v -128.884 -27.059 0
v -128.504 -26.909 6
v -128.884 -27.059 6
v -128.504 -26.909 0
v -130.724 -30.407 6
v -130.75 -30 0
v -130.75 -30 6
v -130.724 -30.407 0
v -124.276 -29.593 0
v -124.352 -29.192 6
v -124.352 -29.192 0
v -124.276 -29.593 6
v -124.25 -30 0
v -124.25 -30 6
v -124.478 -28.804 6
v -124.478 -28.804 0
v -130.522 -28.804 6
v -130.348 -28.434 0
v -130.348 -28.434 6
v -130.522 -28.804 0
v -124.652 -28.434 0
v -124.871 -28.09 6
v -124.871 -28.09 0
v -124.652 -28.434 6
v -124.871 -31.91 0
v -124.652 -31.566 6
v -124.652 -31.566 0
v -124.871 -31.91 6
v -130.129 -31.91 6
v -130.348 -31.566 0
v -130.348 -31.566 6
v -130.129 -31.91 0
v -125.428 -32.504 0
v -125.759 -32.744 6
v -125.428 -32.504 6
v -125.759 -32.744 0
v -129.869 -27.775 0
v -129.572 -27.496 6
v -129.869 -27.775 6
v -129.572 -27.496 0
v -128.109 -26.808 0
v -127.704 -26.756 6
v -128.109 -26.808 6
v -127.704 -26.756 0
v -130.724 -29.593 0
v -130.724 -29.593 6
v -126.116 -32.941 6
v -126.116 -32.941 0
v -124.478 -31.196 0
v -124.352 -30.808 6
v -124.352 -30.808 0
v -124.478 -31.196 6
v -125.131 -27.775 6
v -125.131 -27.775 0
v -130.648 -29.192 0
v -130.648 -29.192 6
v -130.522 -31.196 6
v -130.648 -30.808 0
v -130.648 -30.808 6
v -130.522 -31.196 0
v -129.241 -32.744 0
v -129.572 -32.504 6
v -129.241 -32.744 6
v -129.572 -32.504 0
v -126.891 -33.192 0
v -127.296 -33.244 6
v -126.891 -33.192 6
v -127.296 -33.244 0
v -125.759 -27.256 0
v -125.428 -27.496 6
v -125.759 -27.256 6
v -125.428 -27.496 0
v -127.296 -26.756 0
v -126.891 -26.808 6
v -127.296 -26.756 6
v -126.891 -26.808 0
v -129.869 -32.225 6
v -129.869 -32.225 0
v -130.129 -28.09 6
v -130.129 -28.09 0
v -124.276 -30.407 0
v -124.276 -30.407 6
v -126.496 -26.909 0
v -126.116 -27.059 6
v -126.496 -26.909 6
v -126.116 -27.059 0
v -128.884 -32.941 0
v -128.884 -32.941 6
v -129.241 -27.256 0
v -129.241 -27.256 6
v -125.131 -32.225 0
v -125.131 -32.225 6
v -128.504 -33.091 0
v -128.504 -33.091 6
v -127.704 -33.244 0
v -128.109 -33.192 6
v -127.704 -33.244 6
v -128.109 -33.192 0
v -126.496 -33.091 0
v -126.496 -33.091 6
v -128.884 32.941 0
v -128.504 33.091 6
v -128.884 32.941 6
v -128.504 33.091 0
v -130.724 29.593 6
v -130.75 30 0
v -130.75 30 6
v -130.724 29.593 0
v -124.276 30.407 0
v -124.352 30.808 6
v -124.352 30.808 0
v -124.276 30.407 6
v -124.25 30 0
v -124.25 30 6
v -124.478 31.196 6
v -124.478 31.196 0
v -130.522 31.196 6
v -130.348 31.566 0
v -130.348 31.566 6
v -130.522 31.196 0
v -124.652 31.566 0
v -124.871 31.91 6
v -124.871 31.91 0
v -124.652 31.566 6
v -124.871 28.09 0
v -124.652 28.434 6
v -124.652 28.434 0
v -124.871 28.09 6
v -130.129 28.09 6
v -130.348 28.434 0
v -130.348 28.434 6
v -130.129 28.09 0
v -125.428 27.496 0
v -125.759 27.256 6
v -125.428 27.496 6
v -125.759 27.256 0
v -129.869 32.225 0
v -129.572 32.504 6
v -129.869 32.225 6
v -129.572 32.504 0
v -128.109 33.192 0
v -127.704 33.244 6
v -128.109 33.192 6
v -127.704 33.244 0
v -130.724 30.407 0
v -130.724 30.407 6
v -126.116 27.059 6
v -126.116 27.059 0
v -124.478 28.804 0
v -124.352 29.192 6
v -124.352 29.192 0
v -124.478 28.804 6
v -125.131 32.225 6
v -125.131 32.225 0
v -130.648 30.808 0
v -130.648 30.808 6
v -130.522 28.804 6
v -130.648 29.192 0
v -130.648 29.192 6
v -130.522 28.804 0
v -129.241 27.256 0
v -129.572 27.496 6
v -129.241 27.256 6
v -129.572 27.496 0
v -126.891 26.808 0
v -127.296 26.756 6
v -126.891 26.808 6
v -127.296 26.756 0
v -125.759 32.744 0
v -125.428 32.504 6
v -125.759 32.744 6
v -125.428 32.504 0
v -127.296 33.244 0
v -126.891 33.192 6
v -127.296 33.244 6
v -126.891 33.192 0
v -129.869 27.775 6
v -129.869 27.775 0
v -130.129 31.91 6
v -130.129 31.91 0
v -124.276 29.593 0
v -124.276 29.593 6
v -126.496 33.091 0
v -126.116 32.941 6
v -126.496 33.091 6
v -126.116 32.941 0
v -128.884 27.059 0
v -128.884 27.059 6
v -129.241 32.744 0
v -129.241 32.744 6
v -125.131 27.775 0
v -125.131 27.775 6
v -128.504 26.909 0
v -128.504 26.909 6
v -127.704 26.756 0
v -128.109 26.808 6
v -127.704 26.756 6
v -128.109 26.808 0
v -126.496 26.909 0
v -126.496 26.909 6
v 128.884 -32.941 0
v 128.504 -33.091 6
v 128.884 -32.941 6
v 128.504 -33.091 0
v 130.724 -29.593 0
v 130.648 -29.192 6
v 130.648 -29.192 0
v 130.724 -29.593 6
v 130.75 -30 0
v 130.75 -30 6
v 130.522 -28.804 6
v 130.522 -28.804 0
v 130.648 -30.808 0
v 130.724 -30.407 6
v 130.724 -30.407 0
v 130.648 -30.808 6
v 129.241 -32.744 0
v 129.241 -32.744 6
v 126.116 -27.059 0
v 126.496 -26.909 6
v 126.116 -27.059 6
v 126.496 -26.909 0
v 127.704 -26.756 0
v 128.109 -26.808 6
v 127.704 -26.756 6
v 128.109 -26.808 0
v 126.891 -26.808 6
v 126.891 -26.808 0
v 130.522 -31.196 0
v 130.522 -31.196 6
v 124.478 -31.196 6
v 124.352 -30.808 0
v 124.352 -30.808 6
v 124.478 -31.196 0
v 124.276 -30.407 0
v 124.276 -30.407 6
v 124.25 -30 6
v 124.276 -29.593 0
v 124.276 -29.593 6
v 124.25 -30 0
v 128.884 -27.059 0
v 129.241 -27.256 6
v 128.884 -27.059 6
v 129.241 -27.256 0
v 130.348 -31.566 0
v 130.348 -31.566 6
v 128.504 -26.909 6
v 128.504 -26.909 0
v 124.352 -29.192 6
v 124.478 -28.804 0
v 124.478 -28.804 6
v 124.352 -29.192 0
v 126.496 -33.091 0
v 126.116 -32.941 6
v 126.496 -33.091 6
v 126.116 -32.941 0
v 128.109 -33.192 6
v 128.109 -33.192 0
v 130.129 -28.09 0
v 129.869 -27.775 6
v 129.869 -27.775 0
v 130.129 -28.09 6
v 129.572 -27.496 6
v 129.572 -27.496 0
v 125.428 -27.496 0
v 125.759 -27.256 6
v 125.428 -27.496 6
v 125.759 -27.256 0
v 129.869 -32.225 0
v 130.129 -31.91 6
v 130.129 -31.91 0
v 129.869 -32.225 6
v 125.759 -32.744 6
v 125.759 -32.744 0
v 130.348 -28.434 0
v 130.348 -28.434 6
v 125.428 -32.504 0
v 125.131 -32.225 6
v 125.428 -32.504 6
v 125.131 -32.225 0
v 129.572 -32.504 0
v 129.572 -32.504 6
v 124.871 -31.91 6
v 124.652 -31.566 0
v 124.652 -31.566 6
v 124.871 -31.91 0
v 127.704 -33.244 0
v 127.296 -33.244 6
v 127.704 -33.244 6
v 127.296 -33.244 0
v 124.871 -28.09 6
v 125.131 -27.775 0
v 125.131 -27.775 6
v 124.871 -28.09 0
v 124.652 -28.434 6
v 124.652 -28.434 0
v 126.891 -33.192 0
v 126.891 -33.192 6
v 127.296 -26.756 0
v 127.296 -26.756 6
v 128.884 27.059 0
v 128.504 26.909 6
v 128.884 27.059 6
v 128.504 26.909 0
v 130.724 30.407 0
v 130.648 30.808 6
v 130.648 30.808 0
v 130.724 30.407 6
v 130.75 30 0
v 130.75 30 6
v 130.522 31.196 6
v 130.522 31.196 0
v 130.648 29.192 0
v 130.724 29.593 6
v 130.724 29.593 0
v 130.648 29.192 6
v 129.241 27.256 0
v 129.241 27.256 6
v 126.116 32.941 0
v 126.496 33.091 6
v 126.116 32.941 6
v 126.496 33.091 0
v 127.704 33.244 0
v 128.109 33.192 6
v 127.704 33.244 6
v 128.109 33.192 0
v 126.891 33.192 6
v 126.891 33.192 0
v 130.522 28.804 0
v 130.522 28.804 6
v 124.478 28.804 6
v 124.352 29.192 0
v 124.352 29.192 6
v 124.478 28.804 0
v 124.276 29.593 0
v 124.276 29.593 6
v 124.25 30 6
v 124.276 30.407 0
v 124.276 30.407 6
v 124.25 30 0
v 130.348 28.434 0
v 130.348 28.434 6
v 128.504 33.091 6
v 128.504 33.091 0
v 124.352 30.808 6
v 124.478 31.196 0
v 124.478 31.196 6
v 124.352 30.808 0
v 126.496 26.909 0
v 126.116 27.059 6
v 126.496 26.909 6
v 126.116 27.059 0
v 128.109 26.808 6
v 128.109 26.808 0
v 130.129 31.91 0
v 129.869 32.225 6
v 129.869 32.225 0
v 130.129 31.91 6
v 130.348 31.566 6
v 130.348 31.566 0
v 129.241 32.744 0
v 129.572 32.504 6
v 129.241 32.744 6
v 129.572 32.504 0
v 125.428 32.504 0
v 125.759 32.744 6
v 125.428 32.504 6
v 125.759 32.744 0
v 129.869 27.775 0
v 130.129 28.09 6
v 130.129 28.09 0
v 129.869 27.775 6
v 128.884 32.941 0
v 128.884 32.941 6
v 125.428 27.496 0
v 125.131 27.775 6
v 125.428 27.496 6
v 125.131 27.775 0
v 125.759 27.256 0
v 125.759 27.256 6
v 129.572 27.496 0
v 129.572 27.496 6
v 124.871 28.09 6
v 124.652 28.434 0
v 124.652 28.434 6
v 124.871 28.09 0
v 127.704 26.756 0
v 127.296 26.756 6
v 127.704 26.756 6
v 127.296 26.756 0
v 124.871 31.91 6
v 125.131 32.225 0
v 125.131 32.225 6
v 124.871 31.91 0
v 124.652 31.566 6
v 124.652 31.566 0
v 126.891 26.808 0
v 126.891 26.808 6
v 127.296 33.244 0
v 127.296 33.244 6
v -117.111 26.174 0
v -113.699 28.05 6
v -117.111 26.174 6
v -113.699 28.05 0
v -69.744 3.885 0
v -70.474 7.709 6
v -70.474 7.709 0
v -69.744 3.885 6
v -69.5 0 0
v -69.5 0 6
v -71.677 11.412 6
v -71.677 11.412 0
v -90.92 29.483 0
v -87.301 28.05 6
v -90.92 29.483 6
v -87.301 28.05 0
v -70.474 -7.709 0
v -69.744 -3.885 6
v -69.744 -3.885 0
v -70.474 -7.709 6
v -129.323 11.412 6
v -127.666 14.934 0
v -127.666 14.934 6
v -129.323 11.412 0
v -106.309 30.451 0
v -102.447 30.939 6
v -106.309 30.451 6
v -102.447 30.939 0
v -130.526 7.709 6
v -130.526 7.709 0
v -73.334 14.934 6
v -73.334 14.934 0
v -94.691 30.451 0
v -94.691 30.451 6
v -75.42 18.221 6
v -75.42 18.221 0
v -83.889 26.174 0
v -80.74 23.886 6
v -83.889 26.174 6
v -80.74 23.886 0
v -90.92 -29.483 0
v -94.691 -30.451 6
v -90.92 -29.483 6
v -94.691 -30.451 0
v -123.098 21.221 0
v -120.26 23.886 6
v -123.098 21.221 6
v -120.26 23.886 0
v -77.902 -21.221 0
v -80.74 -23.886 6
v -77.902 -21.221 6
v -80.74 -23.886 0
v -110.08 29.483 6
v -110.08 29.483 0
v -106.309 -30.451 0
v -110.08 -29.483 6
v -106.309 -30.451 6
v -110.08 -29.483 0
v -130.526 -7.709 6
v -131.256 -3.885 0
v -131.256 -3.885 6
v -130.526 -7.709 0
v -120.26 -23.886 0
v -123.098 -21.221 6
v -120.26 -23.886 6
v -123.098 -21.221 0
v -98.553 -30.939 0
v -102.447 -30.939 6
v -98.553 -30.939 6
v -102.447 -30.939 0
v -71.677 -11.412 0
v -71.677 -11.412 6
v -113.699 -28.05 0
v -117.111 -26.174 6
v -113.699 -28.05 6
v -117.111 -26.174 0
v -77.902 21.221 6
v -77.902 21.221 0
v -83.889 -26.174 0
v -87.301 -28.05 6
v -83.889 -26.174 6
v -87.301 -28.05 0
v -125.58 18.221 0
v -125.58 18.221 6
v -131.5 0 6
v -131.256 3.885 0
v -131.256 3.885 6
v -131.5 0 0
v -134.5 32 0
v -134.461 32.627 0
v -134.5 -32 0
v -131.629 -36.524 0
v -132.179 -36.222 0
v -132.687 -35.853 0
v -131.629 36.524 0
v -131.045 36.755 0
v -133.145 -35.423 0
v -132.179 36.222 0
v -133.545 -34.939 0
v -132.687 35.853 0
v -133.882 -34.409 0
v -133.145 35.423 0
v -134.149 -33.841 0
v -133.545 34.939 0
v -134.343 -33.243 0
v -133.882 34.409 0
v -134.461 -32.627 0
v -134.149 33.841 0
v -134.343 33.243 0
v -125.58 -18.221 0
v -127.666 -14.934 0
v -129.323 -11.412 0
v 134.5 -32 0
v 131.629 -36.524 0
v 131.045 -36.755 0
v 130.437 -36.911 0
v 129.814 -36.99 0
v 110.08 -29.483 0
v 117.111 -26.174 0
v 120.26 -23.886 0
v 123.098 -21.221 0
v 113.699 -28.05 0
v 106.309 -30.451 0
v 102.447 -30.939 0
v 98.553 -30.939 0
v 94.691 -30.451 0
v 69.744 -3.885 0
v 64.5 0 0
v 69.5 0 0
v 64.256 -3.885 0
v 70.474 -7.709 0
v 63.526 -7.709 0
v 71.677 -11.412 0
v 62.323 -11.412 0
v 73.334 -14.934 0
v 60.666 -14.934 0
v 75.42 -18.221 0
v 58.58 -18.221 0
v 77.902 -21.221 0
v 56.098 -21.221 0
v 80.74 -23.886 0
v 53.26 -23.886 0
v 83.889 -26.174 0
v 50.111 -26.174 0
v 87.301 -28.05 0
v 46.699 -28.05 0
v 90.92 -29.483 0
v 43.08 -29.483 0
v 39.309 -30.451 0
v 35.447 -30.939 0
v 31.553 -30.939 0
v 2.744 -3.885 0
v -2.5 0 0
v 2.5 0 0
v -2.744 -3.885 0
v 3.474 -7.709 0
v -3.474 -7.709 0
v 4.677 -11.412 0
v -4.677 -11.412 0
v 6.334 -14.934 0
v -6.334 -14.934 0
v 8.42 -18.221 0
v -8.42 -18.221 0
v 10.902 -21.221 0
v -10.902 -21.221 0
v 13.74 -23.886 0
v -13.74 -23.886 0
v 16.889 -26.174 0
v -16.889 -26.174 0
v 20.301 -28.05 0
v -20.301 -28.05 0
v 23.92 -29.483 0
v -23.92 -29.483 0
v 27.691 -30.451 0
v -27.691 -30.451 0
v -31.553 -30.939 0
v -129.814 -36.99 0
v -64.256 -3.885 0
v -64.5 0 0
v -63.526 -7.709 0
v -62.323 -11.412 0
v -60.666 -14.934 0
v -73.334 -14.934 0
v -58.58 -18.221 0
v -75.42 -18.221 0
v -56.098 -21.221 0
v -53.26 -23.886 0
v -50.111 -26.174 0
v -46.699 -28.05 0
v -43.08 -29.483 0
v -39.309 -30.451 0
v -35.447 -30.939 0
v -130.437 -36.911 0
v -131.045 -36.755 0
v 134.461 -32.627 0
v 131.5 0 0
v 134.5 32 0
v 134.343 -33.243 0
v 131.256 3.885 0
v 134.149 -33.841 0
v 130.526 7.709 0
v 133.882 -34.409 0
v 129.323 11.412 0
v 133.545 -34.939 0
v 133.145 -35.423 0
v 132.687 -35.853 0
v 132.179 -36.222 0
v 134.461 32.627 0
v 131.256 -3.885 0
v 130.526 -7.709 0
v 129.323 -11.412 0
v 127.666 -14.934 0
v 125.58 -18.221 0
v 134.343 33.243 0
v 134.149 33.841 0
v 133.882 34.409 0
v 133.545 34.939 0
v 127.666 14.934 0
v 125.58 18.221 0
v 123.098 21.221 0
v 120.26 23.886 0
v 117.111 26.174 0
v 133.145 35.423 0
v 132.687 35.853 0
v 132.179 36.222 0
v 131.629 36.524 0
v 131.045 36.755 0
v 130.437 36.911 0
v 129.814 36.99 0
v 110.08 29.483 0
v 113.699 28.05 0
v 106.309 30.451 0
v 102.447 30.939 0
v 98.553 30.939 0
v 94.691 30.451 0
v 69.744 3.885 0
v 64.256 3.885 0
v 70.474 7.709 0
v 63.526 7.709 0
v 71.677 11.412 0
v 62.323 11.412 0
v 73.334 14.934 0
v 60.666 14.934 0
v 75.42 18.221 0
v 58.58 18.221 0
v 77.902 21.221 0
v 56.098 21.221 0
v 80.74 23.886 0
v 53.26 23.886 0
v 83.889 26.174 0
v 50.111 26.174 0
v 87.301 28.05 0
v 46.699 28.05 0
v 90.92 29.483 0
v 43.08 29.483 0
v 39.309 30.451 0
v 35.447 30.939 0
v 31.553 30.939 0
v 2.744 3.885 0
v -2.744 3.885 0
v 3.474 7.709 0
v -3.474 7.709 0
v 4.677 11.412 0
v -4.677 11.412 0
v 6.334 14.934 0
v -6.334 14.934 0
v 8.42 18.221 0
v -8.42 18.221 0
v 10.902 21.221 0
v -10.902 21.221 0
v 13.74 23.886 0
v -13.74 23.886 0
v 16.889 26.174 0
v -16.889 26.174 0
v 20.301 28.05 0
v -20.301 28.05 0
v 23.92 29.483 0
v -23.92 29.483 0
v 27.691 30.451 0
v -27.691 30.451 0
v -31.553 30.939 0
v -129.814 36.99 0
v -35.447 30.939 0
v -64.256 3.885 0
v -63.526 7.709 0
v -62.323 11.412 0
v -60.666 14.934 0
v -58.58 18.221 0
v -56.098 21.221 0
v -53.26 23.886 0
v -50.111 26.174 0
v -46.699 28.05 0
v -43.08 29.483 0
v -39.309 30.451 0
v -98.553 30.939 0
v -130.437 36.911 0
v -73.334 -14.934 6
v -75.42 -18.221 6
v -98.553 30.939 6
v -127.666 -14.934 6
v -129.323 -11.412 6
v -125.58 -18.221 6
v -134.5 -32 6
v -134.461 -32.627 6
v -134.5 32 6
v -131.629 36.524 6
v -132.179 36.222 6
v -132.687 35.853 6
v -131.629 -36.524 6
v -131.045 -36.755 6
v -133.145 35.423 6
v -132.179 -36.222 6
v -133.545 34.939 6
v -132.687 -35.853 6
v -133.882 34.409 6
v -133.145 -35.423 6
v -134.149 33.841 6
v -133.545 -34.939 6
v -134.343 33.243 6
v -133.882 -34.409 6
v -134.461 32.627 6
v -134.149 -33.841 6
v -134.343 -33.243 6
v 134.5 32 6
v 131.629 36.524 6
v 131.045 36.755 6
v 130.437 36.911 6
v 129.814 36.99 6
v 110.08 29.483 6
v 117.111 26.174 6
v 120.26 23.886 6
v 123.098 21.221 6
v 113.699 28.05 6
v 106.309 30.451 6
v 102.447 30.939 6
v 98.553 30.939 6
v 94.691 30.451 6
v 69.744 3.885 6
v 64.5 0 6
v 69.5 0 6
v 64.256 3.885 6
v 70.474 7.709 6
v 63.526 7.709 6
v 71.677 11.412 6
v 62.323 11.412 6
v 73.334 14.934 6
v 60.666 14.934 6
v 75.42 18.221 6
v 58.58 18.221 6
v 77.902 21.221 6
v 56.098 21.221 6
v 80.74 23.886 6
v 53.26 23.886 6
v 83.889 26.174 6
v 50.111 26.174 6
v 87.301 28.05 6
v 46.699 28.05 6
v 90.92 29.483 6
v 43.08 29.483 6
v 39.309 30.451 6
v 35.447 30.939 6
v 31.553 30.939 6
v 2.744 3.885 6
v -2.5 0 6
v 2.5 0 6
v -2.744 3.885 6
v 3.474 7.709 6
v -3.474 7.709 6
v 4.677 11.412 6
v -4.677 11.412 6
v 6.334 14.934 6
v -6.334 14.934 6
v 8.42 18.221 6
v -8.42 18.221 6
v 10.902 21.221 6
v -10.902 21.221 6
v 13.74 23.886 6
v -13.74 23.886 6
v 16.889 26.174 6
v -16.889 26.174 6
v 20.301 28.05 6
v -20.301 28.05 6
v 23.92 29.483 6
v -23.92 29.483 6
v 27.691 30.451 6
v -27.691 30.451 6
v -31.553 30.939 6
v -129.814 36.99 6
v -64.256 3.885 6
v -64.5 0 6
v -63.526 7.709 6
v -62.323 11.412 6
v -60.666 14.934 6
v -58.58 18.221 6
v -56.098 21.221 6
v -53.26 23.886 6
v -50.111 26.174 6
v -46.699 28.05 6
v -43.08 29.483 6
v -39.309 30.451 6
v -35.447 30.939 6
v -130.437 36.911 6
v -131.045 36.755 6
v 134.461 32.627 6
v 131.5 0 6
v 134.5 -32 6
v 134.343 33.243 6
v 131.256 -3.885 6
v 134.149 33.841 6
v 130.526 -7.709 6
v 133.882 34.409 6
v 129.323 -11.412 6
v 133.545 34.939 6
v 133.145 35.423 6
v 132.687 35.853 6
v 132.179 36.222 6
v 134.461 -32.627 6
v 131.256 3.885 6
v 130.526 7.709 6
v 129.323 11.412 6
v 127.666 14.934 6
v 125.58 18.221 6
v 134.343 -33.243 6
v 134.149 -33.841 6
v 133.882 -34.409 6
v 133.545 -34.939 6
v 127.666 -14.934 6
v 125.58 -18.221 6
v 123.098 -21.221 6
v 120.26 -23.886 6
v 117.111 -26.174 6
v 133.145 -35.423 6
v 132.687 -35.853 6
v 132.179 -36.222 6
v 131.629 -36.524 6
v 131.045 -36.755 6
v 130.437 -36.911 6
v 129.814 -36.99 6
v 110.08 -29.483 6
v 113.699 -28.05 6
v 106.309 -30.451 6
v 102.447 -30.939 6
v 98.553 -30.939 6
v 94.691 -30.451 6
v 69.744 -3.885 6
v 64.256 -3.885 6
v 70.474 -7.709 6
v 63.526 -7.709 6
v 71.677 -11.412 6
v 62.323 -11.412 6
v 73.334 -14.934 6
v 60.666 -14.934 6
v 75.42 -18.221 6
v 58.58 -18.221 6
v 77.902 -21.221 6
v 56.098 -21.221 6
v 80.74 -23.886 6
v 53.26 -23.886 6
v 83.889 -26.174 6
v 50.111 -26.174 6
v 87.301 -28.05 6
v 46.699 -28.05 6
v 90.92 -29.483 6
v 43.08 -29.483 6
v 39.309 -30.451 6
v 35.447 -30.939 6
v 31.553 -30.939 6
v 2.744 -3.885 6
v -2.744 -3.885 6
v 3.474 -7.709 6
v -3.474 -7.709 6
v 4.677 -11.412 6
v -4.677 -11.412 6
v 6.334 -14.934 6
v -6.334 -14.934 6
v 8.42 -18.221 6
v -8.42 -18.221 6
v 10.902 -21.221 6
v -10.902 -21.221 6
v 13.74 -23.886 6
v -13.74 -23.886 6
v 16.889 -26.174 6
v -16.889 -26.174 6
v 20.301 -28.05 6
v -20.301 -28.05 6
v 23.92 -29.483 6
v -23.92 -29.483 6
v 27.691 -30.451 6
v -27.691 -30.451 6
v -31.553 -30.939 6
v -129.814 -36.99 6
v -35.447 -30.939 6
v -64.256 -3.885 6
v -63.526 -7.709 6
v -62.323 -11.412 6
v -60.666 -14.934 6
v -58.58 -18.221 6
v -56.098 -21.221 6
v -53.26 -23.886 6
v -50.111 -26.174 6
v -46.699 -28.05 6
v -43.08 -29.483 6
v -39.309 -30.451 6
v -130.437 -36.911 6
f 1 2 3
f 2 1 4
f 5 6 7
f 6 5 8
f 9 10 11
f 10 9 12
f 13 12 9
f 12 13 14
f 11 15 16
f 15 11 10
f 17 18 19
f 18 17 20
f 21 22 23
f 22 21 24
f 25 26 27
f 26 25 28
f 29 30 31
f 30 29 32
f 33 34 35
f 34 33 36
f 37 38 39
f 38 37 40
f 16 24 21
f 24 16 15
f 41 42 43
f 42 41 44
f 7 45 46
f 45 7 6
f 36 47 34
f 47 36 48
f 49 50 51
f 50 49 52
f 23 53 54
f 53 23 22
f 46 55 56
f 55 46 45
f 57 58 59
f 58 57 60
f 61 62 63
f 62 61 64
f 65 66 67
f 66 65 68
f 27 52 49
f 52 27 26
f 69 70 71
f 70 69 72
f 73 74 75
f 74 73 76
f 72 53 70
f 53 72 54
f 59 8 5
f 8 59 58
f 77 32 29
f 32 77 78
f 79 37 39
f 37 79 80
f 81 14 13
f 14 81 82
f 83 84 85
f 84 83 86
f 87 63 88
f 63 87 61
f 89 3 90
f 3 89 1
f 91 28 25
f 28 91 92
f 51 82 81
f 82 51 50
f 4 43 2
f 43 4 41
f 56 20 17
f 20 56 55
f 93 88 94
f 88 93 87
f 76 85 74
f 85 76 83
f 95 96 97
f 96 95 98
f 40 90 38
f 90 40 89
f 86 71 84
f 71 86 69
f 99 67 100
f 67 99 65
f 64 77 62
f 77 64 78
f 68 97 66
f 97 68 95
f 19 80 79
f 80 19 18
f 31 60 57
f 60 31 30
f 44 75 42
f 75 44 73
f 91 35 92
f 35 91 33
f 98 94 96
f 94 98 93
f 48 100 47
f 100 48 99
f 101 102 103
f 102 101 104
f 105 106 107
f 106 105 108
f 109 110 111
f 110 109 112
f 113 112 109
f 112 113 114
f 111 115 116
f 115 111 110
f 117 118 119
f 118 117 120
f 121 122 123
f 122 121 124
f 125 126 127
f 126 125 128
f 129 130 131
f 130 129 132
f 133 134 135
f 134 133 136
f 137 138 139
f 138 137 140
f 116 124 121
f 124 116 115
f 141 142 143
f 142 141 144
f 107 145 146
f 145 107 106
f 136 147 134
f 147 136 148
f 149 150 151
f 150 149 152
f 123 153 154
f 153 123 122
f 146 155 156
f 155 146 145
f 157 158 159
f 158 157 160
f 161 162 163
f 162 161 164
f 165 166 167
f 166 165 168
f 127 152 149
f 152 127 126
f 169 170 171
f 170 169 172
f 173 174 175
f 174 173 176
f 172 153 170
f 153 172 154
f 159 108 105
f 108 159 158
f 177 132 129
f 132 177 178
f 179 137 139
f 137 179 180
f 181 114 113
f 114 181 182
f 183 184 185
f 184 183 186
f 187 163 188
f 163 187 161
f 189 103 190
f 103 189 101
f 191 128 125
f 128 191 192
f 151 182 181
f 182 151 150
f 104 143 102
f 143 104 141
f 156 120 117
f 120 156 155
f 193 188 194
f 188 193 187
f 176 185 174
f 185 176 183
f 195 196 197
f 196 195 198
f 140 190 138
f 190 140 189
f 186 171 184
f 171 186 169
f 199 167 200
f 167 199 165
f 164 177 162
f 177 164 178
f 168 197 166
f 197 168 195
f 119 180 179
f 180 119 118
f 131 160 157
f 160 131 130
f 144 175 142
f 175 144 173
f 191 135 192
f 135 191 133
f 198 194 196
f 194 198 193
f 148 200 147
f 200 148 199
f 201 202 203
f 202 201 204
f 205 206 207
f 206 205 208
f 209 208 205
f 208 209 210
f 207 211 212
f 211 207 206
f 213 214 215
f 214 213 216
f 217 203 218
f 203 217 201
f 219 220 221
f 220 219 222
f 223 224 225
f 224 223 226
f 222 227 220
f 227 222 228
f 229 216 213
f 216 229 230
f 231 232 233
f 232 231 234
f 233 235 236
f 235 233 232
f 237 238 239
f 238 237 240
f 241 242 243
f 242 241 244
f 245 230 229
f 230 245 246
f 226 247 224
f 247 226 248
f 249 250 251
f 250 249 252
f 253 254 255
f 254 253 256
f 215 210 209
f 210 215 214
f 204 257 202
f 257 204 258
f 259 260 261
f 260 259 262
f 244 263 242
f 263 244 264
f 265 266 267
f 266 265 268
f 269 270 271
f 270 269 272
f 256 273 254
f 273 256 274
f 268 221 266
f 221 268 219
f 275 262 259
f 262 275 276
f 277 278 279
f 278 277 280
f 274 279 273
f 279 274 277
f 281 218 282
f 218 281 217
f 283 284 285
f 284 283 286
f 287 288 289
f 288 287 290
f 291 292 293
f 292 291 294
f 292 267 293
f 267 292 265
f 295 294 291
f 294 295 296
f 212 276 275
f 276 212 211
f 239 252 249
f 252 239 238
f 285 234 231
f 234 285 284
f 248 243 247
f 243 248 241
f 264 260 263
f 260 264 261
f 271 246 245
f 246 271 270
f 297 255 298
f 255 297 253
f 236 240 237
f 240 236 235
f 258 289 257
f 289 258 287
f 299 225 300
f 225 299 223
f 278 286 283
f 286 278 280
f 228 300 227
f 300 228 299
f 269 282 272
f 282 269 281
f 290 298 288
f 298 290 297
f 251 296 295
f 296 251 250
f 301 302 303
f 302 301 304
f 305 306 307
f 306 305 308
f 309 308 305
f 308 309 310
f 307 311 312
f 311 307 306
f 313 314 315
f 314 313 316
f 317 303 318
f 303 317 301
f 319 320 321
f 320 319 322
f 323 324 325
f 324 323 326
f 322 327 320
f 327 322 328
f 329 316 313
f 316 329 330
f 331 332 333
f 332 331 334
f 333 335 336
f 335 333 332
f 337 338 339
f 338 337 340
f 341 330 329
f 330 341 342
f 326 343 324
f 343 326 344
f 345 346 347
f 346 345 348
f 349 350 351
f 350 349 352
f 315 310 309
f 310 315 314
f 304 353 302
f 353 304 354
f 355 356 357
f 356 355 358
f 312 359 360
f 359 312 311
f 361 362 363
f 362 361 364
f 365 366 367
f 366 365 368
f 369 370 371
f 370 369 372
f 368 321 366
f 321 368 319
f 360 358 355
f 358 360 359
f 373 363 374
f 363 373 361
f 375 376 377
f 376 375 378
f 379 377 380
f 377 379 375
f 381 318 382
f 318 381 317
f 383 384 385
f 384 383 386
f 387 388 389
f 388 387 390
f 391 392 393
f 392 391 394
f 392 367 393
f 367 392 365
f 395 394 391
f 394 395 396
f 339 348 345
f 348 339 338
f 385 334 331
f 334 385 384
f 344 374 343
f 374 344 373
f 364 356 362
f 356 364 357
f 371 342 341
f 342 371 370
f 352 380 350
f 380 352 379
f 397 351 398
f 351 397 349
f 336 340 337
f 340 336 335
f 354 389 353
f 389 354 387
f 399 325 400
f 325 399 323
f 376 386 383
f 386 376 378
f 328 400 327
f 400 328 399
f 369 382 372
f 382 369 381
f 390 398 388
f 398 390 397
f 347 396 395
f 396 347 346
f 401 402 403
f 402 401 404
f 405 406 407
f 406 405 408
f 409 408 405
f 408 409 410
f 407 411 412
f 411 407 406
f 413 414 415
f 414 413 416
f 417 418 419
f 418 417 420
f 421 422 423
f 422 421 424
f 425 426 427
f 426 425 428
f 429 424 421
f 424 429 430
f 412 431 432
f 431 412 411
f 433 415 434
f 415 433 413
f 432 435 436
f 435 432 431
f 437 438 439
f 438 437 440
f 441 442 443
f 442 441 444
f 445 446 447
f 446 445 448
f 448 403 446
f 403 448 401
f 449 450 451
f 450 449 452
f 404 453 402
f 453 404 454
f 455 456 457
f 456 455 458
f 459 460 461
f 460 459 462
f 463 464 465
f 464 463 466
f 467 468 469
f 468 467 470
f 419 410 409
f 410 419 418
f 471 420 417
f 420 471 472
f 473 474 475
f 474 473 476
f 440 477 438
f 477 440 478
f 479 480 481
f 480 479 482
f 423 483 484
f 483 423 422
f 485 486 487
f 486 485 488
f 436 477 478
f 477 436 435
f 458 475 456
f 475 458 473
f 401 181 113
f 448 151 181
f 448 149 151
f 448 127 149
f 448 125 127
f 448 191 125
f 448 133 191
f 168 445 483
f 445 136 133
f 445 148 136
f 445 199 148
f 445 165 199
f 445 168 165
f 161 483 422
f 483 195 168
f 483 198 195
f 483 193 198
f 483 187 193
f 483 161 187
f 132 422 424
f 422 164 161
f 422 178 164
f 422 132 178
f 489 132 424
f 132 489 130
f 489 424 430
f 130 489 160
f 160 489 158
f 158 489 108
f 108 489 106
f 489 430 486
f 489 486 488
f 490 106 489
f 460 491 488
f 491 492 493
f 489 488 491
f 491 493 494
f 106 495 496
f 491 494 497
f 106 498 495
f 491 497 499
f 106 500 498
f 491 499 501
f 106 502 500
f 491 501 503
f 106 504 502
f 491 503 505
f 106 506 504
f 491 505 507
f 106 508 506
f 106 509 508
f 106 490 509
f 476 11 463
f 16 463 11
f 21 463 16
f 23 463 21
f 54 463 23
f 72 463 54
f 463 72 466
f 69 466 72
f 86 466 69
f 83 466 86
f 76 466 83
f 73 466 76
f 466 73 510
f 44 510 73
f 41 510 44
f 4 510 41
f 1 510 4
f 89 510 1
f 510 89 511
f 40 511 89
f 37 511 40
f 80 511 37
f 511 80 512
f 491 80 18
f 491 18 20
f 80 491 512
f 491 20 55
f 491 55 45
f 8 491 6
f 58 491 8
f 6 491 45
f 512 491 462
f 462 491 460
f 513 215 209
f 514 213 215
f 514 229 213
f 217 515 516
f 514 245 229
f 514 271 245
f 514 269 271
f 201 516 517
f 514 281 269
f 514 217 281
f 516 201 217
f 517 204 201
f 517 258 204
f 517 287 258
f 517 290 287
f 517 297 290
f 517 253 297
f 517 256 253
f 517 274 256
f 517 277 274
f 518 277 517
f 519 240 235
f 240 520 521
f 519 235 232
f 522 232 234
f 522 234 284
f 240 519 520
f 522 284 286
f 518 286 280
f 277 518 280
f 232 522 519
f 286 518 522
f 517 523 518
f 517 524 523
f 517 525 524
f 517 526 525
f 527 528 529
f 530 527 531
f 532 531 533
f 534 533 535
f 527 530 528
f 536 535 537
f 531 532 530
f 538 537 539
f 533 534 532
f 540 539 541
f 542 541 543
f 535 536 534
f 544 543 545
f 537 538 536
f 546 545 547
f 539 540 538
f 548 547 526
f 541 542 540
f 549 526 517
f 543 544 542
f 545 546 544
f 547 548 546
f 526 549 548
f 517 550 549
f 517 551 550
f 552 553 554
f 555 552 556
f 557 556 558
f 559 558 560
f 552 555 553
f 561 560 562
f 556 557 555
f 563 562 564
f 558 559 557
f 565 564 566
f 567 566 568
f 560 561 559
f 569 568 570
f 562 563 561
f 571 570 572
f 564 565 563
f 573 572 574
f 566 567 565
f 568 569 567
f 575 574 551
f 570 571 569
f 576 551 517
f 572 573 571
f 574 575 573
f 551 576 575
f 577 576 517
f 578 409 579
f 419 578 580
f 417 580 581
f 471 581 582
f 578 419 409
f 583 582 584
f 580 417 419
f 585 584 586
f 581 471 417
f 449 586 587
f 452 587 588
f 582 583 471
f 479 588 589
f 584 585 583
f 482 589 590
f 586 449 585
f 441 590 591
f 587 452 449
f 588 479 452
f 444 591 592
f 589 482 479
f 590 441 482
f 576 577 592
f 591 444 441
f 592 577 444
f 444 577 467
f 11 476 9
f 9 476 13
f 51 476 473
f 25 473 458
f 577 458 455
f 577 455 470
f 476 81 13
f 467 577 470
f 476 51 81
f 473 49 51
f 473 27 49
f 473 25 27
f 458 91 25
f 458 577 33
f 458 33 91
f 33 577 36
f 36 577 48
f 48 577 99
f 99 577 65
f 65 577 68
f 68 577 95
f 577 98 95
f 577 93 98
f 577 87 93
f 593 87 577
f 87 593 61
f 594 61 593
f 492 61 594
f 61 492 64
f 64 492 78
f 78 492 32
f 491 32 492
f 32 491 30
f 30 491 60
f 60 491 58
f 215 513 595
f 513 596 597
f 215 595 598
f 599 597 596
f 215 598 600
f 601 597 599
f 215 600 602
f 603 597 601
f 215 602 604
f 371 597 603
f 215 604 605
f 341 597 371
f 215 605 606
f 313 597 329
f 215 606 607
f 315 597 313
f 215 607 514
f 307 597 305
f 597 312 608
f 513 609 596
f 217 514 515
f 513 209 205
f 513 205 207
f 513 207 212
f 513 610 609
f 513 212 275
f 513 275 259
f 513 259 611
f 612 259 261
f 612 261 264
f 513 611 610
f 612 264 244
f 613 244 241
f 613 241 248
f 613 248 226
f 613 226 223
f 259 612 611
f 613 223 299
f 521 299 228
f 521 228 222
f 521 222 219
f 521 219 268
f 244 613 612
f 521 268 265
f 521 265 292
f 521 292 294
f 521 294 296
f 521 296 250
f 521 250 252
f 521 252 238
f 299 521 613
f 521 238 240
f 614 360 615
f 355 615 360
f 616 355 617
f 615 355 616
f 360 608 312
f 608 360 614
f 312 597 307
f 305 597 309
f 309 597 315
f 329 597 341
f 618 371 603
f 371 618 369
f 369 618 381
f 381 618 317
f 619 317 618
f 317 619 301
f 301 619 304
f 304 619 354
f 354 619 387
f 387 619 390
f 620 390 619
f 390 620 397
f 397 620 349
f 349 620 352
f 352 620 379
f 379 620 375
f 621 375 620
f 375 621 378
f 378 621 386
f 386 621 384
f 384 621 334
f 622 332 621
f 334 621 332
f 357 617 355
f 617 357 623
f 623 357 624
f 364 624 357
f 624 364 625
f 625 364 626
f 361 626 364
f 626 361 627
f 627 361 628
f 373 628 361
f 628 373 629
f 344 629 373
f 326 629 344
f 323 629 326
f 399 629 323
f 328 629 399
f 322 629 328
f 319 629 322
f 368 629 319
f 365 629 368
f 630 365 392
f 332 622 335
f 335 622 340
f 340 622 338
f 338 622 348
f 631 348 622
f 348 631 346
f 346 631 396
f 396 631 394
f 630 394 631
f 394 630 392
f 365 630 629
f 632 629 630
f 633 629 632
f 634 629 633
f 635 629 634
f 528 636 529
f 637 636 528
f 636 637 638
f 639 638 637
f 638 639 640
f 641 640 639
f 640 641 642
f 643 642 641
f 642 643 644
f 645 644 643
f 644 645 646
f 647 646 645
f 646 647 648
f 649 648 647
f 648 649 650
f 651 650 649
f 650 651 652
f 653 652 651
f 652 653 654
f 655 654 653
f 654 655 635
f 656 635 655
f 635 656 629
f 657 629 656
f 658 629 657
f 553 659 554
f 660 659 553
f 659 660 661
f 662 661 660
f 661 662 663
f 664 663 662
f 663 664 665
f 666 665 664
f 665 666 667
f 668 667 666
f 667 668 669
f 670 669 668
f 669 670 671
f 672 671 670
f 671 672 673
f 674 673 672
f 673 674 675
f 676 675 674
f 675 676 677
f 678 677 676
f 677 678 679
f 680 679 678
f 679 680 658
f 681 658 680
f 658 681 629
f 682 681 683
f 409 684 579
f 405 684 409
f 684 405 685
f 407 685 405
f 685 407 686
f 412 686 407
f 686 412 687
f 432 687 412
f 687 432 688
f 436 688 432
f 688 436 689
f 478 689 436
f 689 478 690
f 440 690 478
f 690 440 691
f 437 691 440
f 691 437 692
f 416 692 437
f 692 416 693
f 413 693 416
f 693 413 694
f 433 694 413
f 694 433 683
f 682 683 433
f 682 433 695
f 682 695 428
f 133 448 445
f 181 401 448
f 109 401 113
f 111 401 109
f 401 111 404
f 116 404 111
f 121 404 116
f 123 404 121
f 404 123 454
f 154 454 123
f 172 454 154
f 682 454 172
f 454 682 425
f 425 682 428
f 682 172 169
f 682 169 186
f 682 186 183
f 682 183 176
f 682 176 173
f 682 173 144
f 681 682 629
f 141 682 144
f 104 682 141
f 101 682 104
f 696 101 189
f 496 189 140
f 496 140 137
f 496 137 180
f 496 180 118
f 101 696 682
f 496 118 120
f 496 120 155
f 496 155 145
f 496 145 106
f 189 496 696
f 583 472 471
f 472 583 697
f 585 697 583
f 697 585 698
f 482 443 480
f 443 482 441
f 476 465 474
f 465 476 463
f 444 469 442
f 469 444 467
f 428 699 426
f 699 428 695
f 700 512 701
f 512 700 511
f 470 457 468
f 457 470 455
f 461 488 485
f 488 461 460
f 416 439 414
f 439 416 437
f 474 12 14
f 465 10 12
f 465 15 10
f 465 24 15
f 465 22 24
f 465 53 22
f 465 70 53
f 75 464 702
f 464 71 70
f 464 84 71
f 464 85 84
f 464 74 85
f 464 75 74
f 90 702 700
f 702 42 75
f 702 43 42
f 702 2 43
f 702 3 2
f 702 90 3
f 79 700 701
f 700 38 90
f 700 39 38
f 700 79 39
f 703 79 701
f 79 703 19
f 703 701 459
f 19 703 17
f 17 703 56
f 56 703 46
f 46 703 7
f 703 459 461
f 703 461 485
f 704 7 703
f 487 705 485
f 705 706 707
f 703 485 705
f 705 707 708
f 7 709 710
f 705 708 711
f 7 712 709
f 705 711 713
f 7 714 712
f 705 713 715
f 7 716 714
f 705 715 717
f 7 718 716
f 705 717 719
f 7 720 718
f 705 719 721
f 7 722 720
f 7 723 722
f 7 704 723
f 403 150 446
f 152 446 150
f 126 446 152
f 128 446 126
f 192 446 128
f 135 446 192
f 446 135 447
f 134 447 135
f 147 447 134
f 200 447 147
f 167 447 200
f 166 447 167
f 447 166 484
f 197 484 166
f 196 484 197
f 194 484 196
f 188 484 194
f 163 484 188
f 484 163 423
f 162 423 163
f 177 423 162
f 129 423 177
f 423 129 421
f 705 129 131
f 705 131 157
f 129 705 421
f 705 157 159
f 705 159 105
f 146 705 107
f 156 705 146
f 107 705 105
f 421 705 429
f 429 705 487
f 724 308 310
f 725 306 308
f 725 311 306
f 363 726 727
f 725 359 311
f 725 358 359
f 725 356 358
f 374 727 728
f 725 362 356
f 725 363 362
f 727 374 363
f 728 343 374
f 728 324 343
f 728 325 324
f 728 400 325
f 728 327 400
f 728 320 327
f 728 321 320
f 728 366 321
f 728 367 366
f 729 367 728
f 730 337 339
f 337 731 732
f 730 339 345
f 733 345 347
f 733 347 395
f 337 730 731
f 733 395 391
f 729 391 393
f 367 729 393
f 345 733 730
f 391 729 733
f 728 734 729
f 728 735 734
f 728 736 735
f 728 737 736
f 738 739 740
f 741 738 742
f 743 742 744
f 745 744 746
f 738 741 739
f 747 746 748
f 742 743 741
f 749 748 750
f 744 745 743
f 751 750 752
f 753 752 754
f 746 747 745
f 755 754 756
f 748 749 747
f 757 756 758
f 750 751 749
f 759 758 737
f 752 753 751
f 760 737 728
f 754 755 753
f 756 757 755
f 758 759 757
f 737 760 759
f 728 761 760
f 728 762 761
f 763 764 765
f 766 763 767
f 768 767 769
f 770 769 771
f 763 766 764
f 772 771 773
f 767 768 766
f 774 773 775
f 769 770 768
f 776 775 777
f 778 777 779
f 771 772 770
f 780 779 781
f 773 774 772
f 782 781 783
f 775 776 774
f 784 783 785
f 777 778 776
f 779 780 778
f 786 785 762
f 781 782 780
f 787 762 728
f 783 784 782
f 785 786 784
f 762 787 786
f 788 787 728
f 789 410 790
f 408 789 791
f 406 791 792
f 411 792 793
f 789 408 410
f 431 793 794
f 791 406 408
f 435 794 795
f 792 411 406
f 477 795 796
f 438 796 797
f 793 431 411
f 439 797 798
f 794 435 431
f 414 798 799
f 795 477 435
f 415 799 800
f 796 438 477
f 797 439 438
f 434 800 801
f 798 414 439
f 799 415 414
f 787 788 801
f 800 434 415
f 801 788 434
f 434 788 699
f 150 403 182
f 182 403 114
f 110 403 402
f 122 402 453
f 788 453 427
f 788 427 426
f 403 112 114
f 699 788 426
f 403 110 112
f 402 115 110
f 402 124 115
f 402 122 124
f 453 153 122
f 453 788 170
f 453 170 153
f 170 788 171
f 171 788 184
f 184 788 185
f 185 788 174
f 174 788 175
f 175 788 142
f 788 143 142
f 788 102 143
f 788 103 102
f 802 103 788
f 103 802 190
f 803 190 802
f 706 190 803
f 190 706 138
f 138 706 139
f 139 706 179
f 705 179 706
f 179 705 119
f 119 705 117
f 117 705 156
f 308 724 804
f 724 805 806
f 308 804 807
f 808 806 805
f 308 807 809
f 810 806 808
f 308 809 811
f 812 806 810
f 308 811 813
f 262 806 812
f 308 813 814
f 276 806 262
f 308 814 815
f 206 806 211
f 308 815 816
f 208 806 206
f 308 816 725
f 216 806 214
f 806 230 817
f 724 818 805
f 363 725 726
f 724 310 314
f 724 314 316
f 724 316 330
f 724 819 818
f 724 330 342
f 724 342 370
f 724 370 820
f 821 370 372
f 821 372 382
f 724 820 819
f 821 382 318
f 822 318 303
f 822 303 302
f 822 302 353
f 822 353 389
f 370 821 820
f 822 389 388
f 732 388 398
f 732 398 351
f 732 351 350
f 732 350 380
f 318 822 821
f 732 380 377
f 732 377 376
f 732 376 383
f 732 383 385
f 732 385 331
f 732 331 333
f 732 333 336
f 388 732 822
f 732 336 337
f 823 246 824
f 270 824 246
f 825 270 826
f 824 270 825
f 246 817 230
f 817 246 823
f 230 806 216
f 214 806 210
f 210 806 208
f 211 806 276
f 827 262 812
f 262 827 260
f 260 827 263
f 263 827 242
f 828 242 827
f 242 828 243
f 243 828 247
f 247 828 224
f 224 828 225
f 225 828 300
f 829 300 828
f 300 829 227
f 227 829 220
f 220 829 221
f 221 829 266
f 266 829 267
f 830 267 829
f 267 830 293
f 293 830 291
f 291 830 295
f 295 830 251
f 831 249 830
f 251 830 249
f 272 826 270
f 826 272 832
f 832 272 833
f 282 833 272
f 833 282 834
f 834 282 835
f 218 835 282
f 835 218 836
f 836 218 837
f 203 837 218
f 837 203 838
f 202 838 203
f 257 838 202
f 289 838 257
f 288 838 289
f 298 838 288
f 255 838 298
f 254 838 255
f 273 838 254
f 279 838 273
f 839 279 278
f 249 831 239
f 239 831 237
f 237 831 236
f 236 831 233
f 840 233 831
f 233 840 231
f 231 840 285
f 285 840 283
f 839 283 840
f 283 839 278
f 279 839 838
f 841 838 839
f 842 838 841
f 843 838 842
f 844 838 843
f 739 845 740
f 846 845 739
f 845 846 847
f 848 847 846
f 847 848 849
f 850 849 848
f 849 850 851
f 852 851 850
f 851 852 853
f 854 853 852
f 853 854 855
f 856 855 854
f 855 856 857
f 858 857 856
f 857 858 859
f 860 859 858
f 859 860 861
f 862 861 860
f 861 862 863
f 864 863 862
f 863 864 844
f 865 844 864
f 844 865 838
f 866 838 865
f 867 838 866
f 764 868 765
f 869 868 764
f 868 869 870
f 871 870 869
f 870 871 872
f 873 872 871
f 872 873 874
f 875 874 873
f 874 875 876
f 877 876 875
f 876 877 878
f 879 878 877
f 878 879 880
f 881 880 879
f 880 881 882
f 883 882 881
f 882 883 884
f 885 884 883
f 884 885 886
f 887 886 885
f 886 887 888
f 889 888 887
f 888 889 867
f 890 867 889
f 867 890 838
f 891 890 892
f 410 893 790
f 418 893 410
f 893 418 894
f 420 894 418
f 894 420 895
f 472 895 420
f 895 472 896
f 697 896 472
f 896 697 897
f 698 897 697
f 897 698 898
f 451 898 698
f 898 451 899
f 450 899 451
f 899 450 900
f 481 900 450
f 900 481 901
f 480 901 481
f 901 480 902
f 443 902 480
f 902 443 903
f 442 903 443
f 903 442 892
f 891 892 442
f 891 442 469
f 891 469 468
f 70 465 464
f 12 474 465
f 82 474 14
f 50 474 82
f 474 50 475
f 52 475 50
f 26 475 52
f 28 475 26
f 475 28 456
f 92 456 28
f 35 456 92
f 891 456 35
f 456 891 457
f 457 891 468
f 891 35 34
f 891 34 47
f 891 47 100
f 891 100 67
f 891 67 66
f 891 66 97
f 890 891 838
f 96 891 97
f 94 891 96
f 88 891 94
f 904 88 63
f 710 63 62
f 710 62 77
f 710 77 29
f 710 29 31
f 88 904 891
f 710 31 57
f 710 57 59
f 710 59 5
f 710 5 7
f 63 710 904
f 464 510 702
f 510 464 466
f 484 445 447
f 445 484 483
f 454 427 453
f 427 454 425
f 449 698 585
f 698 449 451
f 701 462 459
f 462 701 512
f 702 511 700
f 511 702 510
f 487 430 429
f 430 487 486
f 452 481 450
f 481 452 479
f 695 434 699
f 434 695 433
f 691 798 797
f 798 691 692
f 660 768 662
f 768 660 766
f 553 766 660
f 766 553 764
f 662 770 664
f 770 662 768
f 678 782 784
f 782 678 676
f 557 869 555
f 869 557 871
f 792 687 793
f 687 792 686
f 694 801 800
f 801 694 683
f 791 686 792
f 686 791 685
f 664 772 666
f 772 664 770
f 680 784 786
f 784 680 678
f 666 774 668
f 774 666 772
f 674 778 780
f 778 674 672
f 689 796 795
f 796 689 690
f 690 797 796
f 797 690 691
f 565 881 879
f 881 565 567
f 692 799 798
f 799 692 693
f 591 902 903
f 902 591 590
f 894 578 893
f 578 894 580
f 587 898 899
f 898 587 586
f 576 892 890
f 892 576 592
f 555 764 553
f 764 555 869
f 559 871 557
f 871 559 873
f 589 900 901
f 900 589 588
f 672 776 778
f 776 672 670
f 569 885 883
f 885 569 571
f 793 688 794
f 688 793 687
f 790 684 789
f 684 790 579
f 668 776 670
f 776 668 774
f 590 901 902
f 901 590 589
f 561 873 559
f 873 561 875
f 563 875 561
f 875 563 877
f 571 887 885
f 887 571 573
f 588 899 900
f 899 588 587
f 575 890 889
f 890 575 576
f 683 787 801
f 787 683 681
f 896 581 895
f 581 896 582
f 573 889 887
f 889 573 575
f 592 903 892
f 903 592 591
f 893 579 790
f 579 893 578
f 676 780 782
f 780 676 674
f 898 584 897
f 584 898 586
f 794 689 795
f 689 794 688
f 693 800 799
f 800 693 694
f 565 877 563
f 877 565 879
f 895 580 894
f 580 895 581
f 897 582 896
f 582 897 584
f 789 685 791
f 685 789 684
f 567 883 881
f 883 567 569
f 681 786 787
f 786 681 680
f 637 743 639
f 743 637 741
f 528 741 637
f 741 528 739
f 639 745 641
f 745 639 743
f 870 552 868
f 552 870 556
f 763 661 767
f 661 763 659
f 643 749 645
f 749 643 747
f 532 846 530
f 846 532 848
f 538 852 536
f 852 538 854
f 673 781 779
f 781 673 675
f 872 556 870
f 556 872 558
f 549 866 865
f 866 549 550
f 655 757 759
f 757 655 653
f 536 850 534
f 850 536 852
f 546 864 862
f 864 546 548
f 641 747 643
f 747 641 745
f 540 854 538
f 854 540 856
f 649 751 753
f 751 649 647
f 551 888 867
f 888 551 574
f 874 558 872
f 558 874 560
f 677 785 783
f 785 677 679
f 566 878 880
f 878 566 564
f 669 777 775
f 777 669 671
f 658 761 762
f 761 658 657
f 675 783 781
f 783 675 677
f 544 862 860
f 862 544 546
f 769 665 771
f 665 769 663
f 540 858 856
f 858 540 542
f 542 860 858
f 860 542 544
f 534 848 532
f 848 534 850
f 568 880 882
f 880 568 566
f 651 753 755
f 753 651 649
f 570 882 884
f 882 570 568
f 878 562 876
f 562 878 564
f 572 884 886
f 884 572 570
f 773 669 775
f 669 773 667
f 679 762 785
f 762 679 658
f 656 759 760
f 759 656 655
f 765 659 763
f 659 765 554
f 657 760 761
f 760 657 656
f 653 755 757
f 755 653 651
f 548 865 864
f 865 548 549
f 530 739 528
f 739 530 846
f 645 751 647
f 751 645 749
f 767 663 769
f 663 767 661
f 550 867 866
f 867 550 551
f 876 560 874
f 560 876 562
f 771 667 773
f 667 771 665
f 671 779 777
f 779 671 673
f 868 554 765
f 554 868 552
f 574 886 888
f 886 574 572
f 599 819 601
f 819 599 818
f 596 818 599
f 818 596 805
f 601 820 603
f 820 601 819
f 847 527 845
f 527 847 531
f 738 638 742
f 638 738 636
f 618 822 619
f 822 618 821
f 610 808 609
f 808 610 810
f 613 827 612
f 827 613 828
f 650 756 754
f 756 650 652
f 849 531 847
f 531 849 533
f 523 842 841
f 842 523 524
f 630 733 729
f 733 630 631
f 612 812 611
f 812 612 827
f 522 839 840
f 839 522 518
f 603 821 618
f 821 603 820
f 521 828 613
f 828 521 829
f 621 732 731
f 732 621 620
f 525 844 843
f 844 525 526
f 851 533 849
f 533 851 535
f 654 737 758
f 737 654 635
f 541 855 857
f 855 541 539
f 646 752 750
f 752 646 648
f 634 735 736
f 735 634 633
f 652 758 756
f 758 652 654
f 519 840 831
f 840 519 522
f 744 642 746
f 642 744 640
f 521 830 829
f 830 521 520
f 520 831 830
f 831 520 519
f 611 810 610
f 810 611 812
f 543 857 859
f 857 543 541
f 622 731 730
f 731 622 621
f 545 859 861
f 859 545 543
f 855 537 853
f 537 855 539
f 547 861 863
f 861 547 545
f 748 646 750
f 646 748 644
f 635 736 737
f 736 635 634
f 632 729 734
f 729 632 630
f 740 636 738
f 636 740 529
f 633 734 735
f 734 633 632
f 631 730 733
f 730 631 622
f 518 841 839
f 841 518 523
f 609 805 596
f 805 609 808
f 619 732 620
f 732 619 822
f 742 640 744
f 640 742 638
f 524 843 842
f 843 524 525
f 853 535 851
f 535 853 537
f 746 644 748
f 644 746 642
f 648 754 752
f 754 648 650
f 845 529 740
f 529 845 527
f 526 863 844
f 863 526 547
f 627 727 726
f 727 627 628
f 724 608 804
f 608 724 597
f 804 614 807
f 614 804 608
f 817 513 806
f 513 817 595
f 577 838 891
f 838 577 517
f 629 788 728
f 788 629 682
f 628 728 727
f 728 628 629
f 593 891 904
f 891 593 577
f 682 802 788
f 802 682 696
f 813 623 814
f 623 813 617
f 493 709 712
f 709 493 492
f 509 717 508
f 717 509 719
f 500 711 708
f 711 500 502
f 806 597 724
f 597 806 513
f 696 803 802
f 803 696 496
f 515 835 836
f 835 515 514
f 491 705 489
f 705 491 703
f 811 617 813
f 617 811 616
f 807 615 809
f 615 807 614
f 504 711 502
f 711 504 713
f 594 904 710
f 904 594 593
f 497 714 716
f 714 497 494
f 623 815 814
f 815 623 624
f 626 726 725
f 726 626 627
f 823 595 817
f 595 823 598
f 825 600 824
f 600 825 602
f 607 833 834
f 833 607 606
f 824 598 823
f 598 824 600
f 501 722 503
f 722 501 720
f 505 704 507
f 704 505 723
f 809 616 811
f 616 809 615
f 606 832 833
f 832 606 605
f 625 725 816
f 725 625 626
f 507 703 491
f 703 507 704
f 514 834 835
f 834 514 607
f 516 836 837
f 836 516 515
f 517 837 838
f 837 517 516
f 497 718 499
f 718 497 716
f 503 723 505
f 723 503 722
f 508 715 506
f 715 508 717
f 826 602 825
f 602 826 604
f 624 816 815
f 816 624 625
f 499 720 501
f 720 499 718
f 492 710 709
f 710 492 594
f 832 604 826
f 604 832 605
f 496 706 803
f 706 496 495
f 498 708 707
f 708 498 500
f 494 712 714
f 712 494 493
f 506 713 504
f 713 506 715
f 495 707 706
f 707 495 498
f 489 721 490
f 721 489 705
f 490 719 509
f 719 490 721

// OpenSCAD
$fn = 50;


difference() {
	union() {
		hull() {
			translate(v = [-129.5000000000, 32.0000000000, 0]) {
				cylinder(h = 6, r = 5);
			}
			translate(v = [129.5000000000, 32.0000000000, 0]) {
				cylinder(h = 6, r = 5);
			}
			translate(v = [-129.5000000000, -32.0000000000, 0]) {
				cylinder(h = 6, r = 5);
			}
			translate(v = [129.5000000000, -32.0000000000, 0]) {
				cylinder(h = 6, r = 5);
			}
		}
	}
	union() {
		#translate(v = [-127.5000000000, -30.0000000000, -100.0000000000]) {
			cylinder(h = 200, r = 3.2500000000);
		}
		#translate(v = [-127.5000000000, 30.0000000000, -100.0000000000]) {
			cylinder(h = 200, r = 3.2500000000);
		}
		#translate(v = [127.5000000000, -30.0000000000, -100.0000000000]) {
			cylinder(h = 200, r = 3.2500000000);
		}
		#translate(v = [127.5000000000, 30.0000000000, -100.0000000000]) {
			cylinder(h = 200, r = 3.2500000000);
		}
		#translate(v = [-100.5000000000, 0, 0]) {
			cylinder(h = 6, r = 31.0000000000);
		}
		#translate(v = [-33.5000000000, 0, 0]) {
			cylinder(h = 6, r = 31.0000000000);
		}
		#translate(v = [33.5000000000, 0, 0]) {
			cylinder(h = 6, r = 31.0000000000);
		}
		#translate(v = [100.5000000000, 0, 0]) {
			cylinder(h = 6, r = 31.0000000000);
		}
	}
}
